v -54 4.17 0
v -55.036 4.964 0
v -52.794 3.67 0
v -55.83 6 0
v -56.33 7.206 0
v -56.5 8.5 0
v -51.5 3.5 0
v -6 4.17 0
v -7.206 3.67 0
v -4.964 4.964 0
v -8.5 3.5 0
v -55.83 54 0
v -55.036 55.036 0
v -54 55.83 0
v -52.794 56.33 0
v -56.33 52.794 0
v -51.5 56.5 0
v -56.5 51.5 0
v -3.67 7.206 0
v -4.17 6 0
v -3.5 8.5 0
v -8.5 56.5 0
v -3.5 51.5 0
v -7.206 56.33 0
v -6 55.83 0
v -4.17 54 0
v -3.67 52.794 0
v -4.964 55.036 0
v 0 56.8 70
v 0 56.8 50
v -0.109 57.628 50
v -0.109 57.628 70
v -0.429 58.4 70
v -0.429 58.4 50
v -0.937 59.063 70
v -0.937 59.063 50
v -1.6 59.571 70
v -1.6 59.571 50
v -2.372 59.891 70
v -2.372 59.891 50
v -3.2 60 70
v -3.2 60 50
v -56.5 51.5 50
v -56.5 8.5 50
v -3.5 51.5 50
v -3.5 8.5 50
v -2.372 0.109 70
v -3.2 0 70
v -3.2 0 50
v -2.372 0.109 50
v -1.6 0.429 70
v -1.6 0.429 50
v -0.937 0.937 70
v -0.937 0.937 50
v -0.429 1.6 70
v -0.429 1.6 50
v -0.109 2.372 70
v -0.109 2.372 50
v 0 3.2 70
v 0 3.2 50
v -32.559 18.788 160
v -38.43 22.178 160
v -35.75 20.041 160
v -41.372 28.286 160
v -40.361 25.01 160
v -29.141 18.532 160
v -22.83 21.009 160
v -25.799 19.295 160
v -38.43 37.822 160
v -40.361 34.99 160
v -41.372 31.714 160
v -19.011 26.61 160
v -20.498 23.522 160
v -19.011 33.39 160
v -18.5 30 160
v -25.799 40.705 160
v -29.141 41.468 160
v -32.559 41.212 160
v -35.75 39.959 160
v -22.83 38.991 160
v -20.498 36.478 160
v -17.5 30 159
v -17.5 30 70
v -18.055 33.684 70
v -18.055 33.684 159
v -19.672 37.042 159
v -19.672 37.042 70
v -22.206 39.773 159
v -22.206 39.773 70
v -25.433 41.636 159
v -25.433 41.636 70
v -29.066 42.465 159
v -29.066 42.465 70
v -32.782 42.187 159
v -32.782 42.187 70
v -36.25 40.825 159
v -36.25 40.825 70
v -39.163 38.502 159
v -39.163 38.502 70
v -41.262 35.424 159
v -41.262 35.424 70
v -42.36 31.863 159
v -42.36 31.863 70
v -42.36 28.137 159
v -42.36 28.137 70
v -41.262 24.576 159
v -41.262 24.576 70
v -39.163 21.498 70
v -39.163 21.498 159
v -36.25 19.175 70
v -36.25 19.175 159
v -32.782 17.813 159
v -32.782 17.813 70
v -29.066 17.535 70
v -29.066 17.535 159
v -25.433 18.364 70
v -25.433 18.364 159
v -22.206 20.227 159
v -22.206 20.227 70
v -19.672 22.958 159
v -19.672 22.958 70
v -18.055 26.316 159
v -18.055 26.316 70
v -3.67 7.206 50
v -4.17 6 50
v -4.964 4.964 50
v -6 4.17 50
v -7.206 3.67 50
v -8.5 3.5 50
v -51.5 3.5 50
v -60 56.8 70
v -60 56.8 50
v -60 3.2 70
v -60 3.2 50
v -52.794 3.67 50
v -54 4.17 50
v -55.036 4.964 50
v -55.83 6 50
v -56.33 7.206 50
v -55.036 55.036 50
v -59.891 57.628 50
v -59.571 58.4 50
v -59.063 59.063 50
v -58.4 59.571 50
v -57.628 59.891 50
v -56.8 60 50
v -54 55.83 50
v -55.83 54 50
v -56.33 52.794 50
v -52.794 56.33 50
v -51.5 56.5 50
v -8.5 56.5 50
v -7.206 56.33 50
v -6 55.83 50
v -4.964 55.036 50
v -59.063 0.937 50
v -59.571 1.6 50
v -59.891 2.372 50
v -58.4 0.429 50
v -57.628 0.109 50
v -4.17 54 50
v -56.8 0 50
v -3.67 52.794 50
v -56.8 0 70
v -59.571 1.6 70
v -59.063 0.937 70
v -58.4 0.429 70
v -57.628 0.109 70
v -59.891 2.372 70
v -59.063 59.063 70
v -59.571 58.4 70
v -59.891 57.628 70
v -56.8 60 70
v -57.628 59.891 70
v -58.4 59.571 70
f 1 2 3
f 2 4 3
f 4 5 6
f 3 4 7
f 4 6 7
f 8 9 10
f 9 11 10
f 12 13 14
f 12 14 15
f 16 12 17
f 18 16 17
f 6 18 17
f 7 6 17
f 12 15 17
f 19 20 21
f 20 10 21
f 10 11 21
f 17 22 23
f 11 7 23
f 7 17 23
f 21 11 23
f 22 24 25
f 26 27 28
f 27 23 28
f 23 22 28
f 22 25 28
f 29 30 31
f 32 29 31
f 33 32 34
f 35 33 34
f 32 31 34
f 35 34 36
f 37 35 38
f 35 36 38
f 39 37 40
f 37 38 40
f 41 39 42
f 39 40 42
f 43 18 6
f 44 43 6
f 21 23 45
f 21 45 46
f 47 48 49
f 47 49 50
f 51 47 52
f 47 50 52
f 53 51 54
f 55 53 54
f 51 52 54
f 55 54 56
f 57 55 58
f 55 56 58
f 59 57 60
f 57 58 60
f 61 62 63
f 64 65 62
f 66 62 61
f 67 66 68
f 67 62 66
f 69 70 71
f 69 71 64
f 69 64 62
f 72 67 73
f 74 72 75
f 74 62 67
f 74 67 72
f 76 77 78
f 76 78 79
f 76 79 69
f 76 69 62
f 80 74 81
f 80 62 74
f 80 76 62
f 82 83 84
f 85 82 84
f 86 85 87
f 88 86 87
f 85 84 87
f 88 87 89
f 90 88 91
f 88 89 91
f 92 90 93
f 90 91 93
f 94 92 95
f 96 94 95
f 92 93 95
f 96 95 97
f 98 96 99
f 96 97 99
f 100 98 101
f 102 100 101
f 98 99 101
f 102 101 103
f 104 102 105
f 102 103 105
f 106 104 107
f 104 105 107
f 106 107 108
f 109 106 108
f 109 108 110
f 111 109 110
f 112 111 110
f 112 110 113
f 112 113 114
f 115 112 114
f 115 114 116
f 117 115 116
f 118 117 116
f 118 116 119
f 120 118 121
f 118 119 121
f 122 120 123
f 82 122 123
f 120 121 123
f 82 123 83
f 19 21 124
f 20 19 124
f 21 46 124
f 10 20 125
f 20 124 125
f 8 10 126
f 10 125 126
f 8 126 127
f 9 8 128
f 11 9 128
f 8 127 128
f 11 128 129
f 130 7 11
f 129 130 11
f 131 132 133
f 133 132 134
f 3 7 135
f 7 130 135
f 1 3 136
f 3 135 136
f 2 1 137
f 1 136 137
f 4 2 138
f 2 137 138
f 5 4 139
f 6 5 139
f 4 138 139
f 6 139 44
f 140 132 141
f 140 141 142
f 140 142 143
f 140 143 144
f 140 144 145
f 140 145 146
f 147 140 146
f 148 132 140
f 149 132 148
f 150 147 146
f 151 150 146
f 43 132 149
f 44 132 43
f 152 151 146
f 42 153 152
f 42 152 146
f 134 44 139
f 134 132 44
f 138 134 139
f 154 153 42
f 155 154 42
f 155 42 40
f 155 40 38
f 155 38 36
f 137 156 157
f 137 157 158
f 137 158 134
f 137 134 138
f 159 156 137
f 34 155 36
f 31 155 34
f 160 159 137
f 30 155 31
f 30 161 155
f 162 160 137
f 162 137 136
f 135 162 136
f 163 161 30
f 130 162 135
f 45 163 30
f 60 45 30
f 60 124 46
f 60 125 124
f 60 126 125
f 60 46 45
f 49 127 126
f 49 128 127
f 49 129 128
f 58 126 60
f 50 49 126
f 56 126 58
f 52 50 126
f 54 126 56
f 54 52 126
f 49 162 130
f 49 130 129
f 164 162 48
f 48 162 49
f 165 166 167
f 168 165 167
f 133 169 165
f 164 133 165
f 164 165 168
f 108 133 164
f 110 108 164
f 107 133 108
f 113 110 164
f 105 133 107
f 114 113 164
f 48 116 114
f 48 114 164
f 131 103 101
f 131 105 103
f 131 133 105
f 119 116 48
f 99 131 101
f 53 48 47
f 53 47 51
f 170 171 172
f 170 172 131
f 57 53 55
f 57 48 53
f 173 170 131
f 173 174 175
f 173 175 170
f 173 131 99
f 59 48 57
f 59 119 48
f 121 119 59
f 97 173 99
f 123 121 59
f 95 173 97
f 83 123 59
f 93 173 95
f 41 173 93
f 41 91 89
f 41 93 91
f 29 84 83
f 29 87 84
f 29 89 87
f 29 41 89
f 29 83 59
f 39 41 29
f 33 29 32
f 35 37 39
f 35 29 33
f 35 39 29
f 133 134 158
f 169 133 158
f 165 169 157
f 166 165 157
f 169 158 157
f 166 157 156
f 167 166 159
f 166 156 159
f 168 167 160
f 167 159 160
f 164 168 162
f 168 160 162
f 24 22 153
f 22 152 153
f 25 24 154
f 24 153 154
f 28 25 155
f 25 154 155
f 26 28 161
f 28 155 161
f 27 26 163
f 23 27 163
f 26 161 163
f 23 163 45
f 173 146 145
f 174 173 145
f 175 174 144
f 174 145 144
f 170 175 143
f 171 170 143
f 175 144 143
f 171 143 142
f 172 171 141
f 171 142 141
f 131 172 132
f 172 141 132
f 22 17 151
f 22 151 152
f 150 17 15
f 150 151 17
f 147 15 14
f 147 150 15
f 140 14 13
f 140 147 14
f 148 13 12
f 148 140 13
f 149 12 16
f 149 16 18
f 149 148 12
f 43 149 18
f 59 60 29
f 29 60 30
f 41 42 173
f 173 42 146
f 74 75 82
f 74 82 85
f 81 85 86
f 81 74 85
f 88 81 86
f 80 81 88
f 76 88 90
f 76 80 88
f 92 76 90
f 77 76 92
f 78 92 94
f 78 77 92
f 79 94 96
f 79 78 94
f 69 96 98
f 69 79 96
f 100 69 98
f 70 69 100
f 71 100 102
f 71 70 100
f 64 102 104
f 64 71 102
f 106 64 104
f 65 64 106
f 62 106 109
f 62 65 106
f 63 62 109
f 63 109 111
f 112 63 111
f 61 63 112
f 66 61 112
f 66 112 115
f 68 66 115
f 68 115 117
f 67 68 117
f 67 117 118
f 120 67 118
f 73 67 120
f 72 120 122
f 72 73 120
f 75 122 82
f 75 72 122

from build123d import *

# Parameters (mm, degrees)
F1_DEPTH = 70
F2_W     = 53
F2_H     = 53
F3_DEPTH = 50
F4_R     = 5
F5_R     = 12.5
F6_DEPTH = 90
F7_SIZE  = 1


with BuildPart() as f1:
    # F0 (on Top) → F1 (new body)
    with BuildSketch(Plane.XY):
        with BuildLine():
            ThreePointArc((-60, 3.2), (-59.062742, 0.937258), (-56.8, 0))
            Line((-56.8, 0), (-3.2, 0))
            ThreePointArc((-3.2, 0), (-0.937258, 0.937258), (0, 3.2))
            Line((0, 3.2), (0, 56.8))
            ThreePointArc((0, 56.8), (-0.937258, 59.062742), (-3.2, 60))
            Line((-3.2, 60), (-56.8, 60))
            ThreePointArc((-56.8, 60), (-59.062742, 59.062742), (-60, 56.8))
            Line((-60, 56.8), (-60, 3.2))
        make_face()
    extrude(amount=F1_DEPTH)

    # F2 (on face) → F3 (cut)
    with BuildSketch(Plane(origin=(0, 0, 0), x_dir=(1, 0, 0), z_dir=(0, 0, -1))):
        with BuildLine():
            Line((-3.2, 0), (-56.8, 0))
            ThreePointArc((-56.8, 0), (-59.062742, -0.937258), (-60, -3.2))
            Line((-60, -3.2), (-60, -56.8))
            ThreePointArc((-60, -56.8), (-59.062742, -59.062742), (-56.8, -60))
            Line((-56.8, -60), (-3.2, -60))
            ThreePointArc((-3.2, -60), (-0.937258, -59.062742), (0, -56.8))
            Line((0, -56.8), (0, -3.2))
            ThreePointArc((0, -3.2), (-0.937258, -0.937258), (-3.2, 0))
        make_face()
        with Locations((-30, -30)):
            Rectangle(F2_W, F2_H, mode=Mode.SUBTRACT)
    extrude(amount=-F3_DEPTH, mode=Mode.SUBTRACT)

    # F4
    f4_edges = [f1.edges().sort_by_distance(p)[0] for p in [
        (-56.5, 3.5, 25),
        (-3.5, 3.5, 25),
        (-3.5, 56.5, 25),
        (-56.5, 56.5, 25),
    ]]
    fillet(f4_edges, radius=F4_R)

    # F5 (on face) → F6 (join)
    with BuildSketch(Plane.XY.offset(70)):
        with Locations((-30, 30)):
            Circle(F5_R)
    extrude(amount=F6_DEPTH)

    # F7
    f7_edges = [f1.edges().sort_by_distance(p)[0] for p in [
        (-42.5, 30, 160),
    ]]
    chamfer(f7_edges, length=F7_SIZE)


solid = f1.part
